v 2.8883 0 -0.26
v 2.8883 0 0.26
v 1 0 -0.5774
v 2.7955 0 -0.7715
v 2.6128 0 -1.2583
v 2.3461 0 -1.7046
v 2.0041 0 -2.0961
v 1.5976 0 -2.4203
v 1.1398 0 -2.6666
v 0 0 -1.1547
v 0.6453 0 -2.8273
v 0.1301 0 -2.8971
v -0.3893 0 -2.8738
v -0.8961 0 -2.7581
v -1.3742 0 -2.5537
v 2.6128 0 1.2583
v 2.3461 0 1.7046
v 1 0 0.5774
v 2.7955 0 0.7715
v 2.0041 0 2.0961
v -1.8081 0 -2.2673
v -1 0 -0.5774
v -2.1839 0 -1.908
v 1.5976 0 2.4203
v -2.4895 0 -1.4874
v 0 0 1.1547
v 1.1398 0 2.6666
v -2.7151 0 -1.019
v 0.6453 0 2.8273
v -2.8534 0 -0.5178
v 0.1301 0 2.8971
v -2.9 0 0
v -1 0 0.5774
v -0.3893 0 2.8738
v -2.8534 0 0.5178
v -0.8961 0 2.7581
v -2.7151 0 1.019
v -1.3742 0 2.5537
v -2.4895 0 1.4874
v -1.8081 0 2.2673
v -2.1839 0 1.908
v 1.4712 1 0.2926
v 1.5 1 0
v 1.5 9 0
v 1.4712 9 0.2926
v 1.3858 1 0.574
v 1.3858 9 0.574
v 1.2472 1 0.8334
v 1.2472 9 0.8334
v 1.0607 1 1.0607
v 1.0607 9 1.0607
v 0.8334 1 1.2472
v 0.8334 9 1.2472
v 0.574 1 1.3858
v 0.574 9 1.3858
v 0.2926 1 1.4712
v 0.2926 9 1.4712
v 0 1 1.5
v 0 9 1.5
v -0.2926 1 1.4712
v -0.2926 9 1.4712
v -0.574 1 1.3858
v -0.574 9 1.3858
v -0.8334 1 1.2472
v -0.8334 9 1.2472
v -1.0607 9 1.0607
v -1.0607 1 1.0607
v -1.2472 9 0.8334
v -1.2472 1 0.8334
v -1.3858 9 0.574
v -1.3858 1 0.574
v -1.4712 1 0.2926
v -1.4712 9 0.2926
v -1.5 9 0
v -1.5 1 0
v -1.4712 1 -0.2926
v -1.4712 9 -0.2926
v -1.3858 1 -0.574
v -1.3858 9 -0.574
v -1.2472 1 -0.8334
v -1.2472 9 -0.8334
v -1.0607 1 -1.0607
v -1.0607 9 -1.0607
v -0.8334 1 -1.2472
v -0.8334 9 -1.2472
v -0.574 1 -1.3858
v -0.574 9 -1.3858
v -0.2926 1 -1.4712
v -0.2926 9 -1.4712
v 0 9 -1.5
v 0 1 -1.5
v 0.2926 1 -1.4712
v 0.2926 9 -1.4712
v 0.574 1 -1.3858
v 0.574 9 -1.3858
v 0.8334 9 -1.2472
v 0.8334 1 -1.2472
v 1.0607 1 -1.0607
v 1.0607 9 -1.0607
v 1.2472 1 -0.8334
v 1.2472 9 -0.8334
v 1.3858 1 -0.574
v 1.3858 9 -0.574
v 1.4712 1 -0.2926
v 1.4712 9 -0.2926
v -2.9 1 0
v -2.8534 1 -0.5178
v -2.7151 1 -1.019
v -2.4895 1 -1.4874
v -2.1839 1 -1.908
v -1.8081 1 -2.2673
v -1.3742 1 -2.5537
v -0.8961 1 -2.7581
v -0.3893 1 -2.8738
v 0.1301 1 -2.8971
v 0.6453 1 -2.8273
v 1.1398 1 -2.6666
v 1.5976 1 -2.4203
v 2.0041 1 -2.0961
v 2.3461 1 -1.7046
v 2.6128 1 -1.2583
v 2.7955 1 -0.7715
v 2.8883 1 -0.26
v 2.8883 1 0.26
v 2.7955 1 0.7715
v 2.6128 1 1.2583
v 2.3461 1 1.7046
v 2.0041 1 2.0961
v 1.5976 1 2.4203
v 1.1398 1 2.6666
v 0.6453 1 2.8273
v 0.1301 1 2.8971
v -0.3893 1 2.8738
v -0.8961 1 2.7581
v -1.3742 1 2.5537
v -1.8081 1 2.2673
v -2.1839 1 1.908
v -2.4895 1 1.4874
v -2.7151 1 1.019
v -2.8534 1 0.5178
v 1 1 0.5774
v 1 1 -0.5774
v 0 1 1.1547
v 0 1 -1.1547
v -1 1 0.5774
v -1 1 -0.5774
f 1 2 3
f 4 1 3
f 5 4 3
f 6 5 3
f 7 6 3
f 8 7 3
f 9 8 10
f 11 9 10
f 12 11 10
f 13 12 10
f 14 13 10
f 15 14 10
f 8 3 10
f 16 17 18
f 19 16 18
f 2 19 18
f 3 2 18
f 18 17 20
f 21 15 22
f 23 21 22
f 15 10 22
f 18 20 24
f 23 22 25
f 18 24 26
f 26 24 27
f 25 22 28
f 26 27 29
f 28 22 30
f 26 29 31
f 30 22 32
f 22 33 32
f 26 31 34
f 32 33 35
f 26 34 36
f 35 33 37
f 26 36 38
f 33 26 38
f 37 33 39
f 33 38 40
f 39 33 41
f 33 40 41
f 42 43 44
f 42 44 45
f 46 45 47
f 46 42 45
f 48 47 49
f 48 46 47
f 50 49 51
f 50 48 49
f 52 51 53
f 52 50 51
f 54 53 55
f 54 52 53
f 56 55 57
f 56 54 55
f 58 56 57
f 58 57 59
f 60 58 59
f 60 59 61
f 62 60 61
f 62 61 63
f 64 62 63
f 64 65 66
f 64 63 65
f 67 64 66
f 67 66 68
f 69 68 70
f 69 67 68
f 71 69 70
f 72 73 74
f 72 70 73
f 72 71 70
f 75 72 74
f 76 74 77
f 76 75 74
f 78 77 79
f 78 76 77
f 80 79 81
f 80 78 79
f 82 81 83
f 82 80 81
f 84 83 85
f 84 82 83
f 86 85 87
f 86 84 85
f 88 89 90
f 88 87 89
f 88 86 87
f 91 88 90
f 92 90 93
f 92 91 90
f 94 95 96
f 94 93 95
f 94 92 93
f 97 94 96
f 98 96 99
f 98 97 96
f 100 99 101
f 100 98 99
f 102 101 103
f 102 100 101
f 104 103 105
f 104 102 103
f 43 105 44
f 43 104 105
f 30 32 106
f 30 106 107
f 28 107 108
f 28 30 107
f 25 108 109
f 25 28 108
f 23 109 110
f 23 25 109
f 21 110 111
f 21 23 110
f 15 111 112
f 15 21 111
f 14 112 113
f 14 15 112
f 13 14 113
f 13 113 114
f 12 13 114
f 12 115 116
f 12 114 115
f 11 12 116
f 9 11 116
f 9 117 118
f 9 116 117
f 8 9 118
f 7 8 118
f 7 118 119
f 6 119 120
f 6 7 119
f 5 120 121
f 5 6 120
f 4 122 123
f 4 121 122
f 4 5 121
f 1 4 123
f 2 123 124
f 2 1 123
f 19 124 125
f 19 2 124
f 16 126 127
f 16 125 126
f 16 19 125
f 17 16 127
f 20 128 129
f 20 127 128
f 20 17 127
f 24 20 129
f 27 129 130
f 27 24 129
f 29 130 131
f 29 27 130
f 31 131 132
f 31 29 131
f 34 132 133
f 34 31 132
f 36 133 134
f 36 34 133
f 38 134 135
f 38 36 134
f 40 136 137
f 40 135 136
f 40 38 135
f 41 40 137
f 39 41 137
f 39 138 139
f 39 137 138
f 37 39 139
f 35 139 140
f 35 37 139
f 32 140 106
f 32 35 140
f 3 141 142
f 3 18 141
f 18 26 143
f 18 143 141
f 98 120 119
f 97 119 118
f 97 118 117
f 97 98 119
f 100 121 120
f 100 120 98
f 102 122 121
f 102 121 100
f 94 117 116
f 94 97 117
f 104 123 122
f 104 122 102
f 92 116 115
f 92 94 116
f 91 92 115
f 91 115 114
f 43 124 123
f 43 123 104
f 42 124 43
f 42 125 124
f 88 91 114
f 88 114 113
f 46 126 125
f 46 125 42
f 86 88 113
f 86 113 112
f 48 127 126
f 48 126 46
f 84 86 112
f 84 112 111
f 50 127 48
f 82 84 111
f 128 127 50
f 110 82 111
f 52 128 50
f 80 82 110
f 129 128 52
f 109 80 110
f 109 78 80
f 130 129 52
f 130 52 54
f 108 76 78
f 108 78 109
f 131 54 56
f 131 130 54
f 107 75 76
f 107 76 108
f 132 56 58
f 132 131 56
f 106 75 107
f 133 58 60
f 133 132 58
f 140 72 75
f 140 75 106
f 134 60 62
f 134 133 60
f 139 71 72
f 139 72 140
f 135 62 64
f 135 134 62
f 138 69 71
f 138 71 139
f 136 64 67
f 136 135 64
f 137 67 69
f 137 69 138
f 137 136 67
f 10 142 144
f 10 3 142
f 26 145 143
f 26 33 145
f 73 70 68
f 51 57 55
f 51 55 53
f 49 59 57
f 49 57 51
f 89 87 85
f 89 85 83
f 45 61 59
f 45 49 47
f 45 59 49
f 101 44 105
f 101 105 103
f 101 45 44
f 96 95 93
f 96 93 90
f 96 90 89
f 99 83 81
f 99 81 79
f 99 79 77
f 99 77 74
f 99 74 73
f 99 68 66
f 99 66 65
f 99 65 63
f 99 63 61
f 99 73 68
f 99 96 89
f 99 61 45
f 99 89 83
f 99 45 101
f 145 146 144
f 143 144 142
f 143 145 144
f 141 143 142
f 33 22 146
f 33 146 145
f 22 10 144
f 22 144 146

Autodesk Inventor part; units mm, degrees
ref_plane "YZ Plane" through (0, 0, 0) normal (1, 0, 0) x (0, 1, 0)
ref_plane "XZ Plane" through (0, 0, 0) normal (0, 1, 0) x (-1, 0, 0)
ref_plane "XY Plane" through (0, 0, 0) normal (0, 0, 1) x (1, 0, 0)
sketch "Sketch1" plane through (0, 0, 0) normal (0, 1, 0) x (-1, 0, 0)
  circle A0 centre (0, 0) radius 2.9
  dimension "d0" = 5.8
extrude "Extrusion1" add sketch "Sketch1" along normal blind 1
sketch "Sketch2" plane through (0, 1, 0) normal (0, 1, 0) x (1, 0, 0)
  circle A0 centre (0, 0) radius 1.5
  dimension "d3" = 3
extrude "Extrusion2" add sketch "Sketch2" along normal blind 8
sketch "Sketch3" plane through (0, 0, 0) normal (0, -1, 0) x (1, 0, 0)
  line L0 (0, -1.1547) -> (-1, -0.5774)
  line L1 (-1, -0.5774) -> (-1, 0.5774)
  line L2 (-1, 0.5774) -> (0, 1.1547)
  line L3 (0, 1.1547) -> (1, 0.5774)
  line L4 (1, 0.5774) -> (1, -0.5774)
  line L5 (1, -0.5774) -> (0, -1.1547)
  point P0 (0, 0)
  point P1 (0, 0)
  dimension "d6" = 2
extrude "Extrusion3" cut sketch "Sketch3" against normal blind 1
properties part number "m3_bolt_pan_8mm" material "Stainless Steel"
